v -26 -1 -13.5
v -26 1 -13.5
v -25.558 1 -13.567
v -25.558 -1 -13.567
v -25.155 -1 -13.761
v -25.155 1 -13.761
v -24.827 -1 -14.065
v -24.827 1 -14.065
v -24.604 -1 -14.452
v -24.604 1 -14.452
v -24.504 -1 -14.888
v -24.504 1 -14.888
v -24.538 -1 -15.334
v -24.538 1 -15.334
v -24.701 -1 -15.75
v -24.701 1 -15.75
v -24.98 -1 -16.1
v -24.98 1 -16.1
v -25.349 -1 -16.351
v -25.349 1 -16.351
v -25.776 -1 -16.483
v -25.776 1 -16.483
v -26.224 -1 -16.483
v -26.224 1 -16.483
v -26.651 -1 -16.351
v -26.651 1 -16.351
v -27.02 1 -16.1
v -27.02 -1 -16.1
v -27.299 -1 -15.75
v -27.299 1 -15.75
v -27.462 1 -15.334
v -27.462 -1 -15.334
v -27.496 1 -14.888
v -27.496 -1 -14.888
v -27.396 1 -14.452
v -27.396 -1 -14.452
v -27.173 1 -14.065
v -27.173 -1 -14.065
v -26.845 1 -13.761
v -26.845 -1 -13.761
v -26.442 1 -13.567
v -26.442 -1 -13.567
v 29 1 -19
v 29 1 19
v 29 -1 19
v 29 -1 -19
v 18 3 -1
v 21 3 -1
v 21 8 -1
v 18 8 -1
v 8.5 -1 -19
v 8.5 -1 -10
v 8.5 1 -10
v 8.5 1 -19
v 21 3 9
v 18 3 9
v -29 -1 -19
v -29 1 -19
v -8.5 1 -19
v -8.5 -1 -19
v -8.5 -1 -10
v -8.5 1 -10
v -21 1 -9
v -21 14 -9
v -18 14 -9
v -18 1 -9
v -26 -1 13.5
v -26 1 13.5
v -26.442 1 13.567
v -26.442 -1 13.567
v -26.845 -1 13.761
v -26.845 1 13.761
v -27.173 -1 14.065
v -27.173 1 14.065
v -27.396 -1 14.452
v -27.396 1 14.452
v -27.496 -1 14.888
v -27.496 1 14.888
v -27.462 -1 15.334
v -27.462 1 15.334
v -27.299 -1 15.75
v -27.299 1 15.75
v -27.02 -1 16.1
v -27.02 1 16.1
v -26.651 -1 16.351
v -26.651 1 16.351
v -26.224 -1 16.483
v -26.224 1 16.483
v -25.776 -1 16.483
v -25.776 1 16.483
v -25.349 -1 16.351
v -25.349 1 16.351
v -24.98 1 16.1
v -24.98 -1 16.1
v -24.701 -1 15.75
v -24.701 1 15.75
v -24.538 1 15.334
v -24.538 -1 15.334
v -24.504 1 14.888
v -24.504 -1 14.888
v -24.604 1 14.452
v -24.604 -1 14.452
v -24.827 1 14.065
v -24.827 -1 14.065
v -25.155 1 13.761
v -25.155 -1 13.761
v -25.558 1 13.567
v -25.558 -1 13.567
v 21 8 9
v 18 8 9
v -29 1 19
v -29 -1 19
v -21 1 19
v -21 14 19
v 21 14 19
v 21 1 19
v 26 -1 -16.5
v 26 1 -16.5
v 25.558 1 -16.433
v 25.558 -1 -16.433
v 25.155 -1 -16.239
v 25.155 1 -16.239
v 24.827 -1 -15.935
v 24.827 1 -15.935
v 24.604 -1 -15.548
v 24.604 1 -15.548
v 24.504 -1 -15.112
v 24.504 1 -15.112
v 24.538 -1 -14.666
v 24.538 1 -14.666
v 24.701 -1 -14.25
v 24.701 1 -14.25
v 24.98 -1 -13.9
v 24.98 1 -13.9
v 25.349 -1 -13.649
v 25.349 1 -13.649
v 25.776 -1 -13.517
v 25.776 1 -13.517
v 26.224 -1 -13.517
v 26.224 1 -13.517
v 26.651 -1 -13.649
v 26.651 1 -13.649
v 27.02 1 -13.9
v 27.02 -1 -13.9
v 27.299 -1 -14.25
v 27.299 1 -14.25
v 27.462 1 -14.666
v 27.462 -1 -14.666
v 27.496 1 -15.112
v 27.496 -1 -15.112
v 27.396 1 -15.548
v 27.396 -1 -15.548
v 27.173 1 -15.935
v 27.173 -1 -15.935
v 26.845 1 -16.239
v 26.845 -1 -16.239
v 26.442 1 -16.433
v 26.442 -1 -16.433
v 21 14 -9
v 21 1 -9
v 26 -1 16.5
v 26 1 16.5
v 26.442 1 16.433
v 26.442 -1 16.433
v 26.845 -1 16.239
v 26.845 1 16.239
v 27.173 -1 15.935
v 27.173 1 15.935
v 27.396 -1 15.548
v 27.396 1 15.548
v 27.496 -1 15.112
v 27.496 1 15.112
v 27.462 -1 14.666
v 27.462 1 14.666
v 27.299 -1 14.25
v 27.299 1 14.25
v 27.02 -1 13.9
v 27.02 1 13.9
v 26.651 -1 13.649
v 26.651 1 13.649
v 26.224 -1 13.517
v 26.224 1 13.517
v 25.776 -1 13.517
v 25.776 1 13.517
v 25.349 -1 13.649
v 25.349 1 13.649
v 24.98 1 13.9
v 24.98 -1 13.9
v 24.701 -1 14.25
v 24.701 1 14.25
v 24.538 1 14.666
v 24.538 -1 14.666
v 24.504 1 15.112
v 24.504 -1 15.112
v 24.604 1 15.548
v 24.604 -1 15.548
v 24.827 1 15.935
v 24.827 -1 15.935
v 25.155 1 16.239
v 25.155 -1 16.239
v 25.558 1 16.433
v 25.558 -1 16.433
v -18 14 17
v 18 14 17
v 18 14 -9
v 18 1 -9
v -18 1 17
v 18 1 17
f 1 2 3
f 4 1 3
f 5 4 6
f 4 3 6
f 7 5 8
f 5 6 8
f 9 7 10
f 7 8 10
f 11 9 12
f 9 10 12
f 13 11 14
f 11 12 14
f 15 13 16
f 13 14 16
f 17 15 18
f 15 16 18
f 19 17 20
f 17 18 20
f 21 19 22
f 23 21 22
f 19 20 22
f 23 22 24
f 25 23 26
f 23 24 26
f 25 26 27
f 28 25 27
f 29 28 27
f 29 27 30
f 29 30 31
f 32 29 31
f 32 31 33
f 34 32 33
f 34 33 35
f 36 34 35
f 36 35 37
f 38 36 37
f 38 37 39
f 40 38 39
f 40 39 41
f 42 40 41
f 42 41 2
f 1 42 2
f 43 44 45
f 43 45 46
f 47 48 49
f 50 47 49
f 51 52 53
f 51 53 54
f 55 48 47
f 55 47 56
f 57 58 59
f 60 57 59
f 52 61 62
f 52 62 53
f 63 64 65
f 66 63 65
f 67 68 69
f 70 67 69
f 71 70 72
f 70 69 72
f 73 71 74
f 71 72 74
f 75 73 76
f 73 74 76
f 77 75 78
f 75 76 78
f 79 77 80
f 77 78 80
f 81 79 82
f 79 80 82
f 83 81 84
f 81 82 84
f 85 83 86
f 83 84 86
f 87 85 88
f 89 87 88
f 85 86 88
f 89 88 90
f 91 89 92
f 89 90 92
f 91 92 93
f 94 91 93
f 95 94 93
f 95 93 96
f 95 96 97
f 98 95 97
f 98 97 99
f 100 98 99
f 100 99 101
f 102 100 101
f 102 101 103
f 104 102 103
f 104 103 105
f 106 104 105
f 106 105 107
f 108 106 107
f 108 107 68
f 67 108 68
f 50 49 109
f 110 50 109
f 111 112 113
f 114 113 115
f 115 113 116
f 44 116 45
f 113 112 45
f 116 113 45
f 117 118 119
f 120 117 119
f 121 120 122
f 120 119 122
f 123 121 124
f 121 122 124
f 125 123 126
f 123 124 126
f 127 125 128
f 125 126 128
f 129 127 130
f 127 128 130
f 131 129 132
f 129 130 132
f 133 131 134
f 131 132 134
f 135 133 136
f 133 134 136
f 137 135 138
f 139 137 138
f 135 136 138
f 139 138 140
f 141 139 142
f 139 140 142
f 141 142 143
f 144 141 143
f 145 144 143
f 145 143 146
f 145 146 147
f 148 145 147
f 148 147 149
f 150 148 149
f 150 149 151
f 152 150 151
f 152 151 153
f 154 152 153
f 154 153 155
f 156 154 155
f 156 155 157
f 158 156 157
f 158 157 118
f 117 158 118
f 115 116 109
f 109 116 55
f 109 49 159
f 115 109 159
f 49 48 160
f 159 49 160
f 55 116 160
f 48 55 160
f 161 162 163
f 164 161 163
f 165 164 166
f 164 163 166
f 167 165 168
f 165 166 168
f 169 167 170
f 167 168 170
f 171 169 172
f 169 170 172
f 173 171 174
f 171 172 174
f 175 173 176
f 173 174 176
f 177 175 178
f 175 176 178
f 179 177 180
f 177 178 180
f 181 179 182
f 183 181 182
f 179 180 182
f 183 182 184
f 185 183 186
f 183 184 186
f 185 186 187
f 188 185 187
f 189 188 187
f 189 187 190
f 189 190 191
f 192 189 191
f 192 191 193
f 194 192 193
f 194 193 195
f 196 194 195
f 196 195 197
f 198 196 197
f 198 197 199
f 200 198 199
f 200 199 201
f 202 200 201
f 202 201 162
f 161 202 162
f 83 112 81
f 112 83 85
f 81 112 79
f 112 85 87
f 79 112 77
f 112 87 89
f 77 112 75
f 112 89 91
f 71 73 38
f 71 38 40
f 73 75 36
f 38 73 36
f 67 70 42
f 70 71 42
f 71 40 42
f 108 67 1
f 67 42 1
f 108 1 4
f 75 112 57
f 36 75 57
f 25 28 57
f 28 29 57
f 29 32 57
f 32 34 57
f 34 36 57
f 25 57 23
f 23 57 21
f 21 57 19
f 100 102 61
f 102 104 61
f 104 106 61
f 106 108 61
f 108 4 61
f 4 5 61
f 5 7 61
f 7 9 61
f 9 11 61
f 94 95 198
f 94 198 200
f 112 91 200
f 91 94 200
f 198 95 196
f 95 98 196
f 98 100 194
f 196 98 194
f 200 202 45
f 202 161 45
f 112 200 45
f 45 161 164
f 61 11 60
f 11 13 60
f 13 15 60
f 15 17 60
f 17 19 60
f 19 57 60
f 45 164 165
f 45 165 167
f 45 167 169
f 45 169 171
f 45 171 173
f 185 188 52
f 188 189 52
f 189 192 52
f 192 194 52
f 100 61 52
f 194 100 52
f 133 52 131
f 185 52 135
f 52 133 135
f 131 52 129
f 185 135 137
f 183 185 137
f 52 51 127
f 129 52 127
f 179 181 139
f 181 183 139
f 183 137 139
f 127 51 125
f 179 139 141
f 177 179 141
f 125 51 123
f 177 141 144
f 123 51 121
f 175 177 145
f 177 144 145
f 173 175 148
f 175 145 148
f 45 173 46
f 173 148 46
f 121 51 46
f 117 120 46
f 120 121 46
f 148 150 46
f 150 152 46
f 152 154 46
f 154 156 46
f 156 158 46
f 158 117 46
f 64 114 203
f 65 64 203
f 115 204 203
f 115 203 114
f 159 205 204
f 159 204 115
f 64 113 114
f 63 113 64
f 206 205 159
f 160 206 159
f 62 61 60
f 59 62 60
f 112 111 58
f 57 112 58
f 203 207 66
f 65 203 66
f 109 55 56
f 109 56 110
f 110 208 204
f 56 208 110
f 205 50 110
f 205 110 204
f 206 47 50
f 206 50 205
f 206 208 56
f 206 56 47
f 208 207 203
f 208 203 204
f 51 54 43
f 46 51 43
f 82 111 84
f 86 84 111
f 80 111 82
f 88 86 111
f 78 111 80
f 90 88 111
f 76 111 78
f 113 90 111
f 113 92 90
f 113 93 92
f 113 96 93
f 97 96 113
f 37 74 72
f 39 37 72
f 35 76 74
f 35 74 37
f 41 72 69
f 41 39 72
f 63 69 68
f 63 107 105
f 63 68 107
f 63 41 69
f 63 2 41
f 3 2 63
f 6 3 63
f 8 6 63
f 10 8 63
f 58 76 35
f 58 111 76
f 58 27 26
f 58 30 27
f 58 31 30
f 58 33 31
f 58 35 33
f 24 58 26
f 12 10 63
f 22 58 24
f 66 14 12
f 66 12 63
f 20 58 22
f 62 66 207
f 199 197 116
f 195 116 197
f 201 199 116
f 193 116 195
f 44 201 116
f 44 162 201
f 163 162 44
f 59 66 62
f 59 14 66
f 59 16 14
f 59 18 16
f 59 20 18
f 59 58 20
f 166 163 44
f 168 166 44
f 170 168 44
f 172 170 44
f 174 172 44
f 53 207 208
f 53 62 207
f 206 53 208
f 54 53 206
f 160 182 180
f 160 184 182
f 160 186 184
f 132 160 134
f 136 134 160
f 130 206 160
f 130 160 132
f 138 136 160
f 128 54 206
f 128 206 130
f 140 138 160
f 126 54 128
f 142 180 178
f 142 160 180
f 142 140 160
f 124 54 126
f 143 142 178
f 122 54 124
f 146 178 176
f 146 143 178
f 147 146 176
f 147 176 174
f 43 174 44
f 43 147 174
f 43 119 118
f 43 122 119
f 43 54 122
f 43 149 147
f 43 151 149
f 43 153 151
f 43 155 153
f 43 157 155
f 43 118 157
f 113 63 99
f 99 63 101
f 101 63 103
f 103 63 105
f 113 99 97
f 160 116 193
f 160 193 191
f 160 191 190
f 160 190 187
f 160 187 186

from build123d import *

# Parameters (mm, degrees)
SKETCH1_W               = 58
SKETCH1_H               = 38
BOSS_EXTRUDE1_DEPTH     = 1
CUT_EXTRUDE1_DEPTH      = 35.684290392
CUT_EXTRUDE1_DEPTH_BACK = 35.684290392
SKETCH2_W               = 17
SKETCH2_H               = 14.502040096
SKETCH3_W               = 3
SKETCH3_H               = 27
BOSS_EXTRUDE2_DEPTH     = 13
SKETCH4_W               = 42
SKETCH4_H               = 2
BOSS_EXTRUDE3_DEPTH     = 13
CUT_EXTRUDE2_START      = -42
SKETCH5_W               = 10
SKETCH5_H               = 5
CUT_EXTRUDE2_DEPTH      = 3
CUT_EXTRUDE3_REACH      = 39.027
SKETCH6_R               = 1.5


with BuildPart() as part:
    # Sketch1 → Boss-Extrude1 (new, symmetric)
    with BuildSketch(Plane(origin=(0, 0, 0), x_dir=(1, 0, 0), z_dir=(0, 1, 0))):
        Rectangle(SKETCH1_W, SKETCH1_H)
    extrude(amount=BOSS_EXTRUDE1_DEPTH, both=True)

    # Sketch2 → Cut-Extrude1 (cut, two sides: drawn at the far end of the back side and taken through both)
    with BuildSketch(Plane(origin=(0, 0, 0), x_dir=(1, 0, 0), z_dir=(0, 1, 0)).offset(-CUT_EXTRUDE1_DEPTH_BACK)):
        with Locations((0, 17.251020048)):
            Rectangle(SKETCH2_W, SKETCH2_H)
    extrude(amount=CUT_EXTRUDE1_DEPTH + CUT_EXTRUDE1_DEPTH_BACK, mode=Mode.SUBTRACT)

    # Sketch3 → Boss-Extrude2 (add)
    with BuildSketch(Plane(origin=(0, 1, 0), x_dir=(1, 0, 0), z_dir=(0, 1, 0))):
        with Locations((19.5, -4.5)):
            Rectangle(SKETCH3_W, SKETCH3_H)
        with Locations((-19.5, -4.5)):
            Rectangle(SKETCH3_W, SKETCH3_H)
    extrude(amount=BOSS_EXTRUDE2_DEPTH)

    # Sketch4 → Boss-Extrude3 (add)
    with BuildSketch(Plane(origin=(0, 1, 0), x_dir=(1, 0, 0), z_dir=(0, 1, 0))):
        with Locations((0, -18)):
            Rectangle(SKETCH4_W, SKETCH4_H)
    extrude(amount=BOSS_EXTRUDE3_DEPTH)

    # Sketch5 → Cut-Extrude2 (cut)
    with BuildSketch(Plane.ZY.offset(21).offset(CUT_EXTRUDE2_START)):
        with Locations((4, 5.5)):
            Rectangle(SKETCH5_W, SKETCH5_H)
    extrude(amount=CUT_EXTRUDE2_DEPTH, mode=Mode.SUBTRACT)

    # Sketch6 → Cut-Extrude3 (cut, up to next)
    with BuildSketch(Plane(origin=(0, 1, 0), x_dir=(1, 0, 0), z_dir=(0, 1, 0)), mode=Mode.PRIVATE) as cut_extrude3_sk1:
        with Locations(Location((-26, 15, 0), (0, 0, 270))):
            Circle(SKETCH6_R)
    cut_extrude3_tool1 = extrude(cut_extrude3_sk1.sketch, amount=-CUT_EXTRUDE3_REACH, mode=Mode.PRIVATE) & part.part
    # Sketch6 → Cut-Extrude3 (cut, up to next)
    with BuildSketch(Plane(origin=(0, 1, 0), x_dir=(1, 0, 0), z_dir=(0, 1, 0)), mode=Mode.PRIVATE) as cut_extrude3_sk2:
        with Locations(Location((-26, -15, 0), (0, 0, 90))):
            Circle(SKETCH6_R)
    cut_extrude3_tool2 = extrude(cut_extrude3_sk2.sketch, amount=-CUT_EXTRUDE3_REACH, mode=Mode.PRIVATE) & part.part
    # Sketch6 → Cut-Extrude3 (cut, up to next)
    with BuildSketch(Plane(origin=(0, 1, 0), x_dir=(1, 0, 0), z_dir=(0, 1, 0)), mode=Mode.PRIVATE) as cut_extrude3_sk3:
        with Locations(Location((26, -15, 0), (0, 0, 270))):
            Circle(SKETCH6_R)
    cut_extrude3_tool3 = extrude(cut_extrude3_sk3.sketch, amount=-CUT_EXTRUDE3_REACH, mode=Mode.PRIVATE) & part.part
    # Sketch6 → Cut-Extrude3 (cut, up to next)
    with BuildSketch(Plane(origin=(0, 1, 0), x_dir=(1, 0, 0), z_dir=(0, 1, 0)), mode=Mode.PRIVATE) as cut_extrude3_sk4:
        with Locations(Location((26, 15, 0), (0, 0, 90))):
            Circle(SKETCH6_R)
    cut_extrude3_tool4 = extrude(cut_extrude3_sk4.sketch, amount=-CUT_EXTRUDE3_REACH, mode=Mode.PRIVATE) & part.part
    add(cut_extrude3_tool1.solids().sort_by_distance((-26, 1, -15))[0], mode=Mode.SUBTRACT)
    add(cut_extrude3_tool2.solids().sort_by_distance((-26, 1, 15))[0], mode=Mode.SUBTRACT)
    add(cut_extrude3_tool3.solids().sort_by_distance((26, 1, 15))[0], mode=Mode.SUBTRACT)
    add(cut_extrude3_tool4.solids().sort_by_distance((26, 1, -15))[0], mode=Mode.SUBTRACT)


solid = part.part
